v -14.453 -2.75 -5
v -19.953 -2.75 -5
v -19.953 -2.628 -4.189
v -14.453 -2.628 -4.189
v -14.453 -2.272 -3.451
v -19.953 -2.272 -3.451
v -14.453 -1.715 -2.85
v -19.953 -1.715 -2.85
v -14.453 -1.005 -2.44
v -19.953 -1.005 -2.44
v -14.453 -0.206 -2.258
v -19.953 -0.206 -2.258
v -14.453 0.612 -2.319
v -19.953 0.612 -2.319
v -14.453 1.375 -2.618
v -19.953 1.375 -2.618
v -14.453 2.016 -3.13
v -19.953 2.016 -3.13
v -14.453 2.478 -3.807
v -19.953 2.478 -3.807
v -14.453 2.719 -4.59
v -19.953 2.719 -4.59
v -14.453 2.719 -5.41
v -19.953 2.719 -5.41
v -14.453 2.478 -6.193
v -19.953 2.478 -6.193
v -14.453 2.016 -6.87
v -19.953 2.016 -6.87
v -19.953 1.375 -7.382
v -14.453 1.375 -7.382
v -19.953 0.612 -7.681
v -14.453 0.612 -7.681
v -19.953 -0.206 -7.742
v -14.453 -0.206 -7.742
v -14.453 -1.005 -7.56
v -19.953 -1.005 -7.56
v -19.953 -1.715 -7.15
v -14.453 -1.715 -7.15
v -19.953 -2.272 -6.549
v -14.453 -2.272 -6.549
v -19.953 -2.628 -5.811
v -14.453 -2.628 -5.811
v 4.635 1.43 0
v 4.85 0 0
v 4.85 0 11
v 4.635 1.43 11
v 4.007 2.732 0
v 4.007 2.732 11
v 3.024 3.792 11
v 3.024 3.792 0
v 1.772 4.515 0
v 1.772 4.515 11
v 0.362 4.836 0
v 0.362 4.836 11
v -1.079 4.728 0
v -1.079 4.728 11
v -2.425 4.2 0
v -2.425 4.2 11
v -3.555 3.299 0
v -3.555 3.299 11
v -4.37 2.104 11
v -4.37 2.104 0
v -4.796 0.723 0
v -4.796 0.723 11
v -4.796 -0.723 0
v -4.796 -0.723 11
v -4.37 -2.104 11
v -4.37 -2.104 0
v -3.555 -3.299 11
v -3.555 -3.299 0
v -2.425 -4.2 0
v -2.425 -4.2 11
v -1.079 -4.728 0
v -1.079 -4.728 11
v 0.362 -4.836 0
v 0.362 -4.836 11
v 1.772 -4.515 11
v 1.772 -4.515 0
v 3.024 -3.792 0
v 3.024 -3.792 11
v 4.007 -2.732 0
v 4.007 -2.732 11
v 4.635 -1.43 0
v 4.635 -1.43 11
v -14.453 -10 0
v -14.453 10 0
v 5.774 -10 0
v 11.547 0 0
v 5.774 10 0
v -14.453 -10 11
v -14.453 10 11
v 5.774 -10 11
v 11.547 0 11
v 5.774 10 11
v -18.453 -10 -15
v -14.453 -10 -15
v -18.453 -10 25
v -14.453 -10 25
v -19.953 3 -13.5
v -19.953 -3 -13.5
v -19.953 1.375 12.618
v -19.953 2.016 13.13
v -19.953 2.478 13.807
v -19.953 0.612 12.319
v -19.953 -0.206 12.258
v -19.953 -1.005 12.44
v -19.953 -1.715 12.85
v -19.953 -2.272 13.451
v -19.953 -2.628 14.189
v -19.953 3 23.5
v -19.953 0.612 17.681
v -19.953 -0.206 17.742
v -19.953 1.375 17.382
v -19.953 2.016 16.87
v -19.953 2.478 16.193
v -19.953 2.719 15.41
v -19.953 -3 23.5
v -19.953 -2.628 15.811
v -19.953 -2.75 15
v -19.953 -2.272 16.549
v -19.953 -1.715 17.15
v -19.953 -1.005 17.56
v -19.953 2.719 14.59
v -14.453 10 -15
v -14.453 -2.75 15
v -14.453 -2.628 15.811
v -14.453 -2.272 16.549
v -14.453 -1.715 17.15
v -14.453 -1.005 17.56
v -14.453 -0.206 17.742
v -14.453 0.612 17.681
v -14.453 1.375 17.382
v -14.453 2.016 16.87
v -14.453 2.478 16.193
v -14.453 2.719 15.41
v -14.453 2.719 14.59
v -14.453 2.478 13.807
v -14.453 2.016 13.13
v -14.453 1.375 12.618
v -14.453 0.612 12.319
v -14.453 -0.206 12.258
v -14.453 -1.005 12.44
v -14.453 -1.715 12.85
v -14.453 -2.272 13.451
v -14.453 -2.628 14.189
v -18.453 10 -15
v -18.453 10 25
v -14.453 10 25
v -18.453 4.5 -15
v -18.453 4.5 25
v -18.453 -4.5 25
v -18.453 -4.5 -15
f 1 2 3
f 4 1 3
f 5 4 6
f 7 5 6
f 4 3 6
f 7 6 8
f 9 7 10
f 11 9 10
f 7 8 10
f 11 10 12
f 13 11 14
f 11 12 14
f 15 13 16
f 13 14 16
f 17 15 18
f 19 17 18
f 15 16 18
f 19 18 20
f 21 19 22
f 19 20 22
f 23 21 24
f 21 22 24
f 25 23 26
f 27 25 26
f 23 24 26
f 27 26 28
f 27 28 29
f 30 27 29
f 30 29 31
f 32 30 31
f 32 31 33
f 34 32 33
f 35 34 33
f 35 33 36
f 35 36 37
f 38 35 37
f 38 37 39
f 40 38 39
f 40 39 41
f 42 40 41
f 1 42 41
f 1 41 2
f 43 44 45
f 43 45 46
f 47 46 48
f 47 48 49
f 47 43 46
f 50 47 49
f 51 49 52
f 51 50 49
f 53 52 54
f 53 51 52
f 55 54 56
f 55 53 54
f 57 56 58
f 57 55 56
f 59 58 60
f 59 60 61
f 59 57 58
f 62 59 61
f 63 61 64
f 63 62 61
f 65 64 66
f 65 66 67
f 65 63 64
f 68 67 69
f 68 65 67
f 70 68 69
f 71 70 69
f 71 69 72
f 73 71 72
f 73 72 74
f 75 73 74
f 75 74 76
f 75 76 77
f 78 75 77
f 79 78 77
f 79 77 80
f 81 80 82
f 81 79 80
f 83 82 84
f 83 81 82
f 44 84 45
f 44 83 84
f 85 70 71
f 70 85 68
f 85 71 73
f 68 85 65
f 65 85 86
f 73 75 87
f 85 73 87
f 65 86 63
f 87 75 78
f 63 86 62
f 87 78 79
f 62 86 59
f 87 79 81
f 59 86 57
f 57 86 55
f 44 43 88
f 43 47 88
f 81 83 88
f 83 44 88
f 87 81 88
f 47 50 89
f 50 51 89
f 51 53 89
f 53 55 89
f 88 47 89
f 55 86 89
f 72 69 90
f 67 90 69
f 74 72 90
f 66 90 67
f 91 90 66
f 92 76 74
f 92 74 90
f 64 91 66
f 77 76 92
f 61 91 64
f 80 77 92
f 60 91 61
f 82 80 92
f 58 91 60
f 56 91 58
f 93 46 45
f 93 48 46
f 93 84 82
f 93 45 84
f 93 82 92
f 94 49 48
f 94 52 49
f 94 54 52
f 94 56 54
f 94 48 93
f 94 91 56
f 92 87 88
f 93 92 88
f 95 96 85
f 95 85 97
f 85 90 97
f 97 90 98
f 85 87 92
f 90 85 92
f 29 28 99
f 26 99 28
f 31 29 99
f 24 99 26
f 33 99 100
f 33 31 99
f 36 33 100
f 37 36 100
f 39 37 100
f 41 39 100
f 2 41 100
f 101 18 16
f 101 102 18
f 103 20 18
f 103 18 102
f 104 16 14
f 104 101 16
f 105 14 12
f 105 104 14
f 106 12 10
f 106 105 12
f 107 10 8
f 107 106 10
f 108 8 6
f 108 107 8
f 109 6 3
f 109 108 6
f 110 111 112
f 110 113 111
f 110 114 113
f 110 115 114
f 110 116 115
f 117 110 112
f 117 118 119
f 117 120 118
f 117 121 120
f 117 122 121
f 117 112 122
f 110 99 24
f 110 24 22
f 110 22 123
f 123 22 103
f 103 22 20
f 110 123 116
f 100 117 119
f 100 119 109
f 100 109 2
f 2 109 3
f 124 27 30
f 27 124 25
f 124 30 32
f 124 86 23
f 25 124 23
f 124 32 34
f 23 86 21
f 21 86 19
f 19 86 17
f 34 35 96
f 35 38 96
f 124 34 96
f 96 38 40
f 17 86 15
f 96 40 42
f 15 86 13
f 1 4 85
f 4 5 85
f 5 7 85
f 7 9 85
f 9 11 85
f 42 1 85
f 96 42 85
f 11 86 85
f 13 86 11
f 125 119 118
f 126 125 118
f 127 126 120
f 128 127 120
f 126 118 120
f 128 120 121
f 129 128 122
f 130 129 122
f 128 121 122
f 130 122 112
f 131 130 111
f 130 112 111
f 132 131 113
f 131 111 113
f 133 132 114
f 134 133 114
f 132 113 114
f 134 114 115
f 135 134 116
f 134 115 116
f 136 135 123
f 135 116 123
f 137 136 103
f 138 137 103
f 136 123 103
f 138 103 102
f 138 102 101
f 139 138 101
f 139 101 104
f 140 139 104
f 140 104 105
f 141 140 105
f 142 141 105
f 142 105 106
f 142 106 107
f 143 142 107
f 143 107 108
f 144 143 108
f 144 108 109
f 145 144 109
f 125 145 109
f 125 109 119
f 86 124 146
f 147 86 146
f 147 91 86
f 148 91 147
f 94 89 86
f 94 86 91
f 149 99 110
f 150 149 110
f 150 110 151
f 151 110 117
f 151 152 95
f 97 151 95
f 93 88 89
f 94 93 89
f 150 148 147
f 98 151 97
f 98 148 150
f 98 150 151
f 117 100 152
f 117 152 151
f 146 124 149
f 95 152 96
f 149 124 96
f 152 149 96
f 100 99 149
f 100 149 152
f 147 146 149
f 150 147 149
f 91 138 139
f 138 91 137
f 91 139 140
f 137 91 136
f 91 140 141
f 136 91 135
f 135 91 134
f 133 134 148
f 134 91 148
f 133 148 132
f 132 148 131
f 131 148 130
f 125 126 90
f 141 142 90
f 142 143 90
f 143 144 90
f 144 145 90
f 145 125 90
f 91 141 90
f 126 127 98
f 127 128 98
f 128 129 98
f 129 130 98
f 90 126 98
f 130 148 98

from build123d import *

# Parameters (mm, degrees)
F0_R     = 4.85
F1_DEPTH = 11
F2_W     = 20
F2_H     = 40
F3_DEPTH = 4
F4_W     = 9
F4_H     = 40
F5_DEPTH = 1.5
F6_SIZE  = 1.49999
F7_R     = 2.75
F8_DEPTH = 31.501


# Not quite as in the source:
# - a fillet or chamfer is up to 0.001 mm smaller than in the source, because OpenCascade refuses the exact size


with BuildPart() as f1:
    # F0 (on Top) → F1 (new body)
    with BuildSketch(Plane.XY):
        Polygon((5.7735026919, 10), (-5.7735026919, 10), (-14.4529946162, 10), (-14.4529946162, -10), (-5.7735026919, -10), (5.7735026919, -10), (11.5470053838, 0), align=None)
        Circle(F0_R, mode=Mode.SUBTRACT)
    extrude(amount=F1_DEPTH)

    # F2 (on face) → F3 (join)
    with BuildSketch(Plane(origin=(-14.4529946162, 0, 0), x_dir=(0, -1, 0), z_dir=(-1, 0, 0))):
        with Locations((0, 5)):
            Rectangle(F2_W, F2_H)
    extrude(amount=F3_DEPTH)

    # F4 (on face) → F5 (join)
    with BuildSketch(Plane(origin=(-18.4529946162, 0, 0), x_dir=(0, -1, 0), z_dir=(-1, 0, 0))):
        with Locations((0, 5)):
            Rectangle(F4_W, F4_H)
    extrude(amount=F5_DEPTH)

    # F6 (size 1.5 in the source; OpenCascade refuses exactly that, so slightly less here)
    f6_edges = [f1.edges().sort_by_distance(p)[0] for p in [
        (-19.952995, 0, 25),
        (-19.952995, 4.5, 5),
        (-19.952995, 0, -15),
        (-19.952995, -4.5, 5),
    ]]
    chamfer(f6_edges, length=F6_SIZE)

    # F7 (on face) → F8 (cut, through all)
    with BuildSketch(Plane(origin=(-19.9529946162, 0, 0), x_dir=(0, -1, 0), z_dir=(-1, 0, 0))):
        with Locations((0, 15)):
            Circle(F7_R)
        with Locations((0, -5)):
            Circle(F7_R)
    extrude(amount=-F8_DEPTH, mode=Mode.SUBTRACT)


solid = f1.part
